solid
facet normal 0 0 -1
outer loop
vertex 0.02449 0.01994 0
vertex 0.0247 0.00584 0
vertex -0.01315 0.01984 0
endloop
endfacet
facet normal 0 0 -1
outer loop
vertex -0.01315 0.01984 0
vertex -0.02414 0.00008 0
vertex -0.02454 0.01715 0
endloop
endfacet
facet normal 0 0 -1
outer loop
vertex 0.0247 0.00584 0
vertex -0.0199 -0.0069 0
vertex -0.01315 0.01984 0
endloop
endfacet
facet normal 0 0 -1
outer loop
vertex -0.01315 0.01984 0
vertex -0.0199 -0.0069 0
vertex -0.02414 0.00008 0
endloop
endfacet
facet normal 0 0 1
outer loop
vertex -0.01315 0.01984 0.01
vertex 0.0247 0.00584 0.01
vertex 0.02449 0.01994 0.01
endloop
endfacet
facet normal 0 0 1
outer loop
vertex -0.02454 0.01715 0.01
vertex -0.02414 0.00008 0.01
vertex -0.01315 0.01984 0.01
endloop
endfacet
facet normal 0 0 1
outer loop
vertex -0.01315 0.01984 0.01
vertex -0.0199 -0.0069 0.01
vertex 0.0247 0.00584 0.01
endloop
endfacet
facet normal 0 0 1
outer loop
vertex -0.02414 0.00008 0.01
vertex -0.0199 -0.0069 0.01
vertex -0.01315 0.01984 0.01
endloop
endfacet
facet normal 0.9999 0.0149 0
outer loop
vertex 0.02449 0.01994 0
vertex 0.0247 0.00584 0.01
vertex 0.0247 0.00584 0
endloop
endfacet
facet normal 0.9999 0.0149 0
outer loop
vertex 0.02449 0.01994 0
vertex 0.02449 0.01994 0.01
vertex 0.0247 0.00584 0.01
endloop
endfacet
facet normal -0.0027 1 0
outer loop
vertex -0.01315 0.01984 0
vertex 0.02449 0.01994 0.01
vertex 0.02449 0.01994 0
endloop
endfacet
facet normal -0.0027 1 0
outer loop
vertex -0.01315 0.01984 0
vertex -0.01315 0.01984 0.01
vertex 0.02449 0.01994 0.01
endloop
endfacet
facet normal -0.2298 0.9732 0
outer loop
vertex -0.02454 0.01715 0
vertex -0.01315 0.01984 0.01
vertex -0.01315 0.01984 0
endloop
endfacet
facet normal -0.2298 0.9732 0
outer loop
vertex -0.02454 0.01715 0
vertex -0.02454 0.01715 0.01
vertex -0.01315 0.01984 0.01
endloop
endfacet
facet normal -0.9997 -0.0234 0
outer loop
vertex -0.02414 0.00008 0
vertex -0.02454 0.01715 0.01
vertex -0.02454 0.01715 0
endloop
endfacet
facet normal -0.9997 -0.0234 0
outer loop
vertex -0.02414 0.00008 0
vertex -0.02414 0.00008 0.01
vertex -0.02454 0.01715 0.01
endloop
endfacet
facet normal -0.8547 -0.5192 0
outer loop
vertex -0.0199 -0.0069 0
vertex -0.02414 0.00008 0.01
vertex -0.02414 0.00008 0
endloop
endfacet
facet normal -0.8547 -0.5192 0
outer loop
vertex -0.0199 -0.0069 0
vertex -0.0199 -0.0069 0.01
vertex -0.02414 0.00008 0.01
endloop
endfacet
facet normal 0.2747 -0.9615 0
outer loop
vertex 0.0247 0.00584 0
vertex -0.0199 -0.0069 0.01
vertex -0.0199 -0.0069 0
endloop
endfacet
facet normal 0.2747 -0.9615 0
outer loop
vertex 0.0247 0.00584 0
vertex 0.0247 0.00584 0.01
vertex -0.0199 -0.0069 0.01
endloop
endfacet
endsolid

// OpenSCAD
                        p1 = [0.024714122445207556, 0.005856151862934991];
                        p2 = [0.024497204174517076, 0.019948254100679342];
                        p3 = [-0.013153861690080176, 0.019840952092155226];
                        p4 = [-0.024550563711868964, 0.01715471649157126];
                        p5 = [-0.02415322817041728, 8.51811347042479e-05];
                        p6 = [-0.019911915049509128, -0.006912079789447412];
                        points = [p1, p2, p3, p4, p5, p6];
                        linear_extrude(height=0.01)
                        polygon(points);
                        
